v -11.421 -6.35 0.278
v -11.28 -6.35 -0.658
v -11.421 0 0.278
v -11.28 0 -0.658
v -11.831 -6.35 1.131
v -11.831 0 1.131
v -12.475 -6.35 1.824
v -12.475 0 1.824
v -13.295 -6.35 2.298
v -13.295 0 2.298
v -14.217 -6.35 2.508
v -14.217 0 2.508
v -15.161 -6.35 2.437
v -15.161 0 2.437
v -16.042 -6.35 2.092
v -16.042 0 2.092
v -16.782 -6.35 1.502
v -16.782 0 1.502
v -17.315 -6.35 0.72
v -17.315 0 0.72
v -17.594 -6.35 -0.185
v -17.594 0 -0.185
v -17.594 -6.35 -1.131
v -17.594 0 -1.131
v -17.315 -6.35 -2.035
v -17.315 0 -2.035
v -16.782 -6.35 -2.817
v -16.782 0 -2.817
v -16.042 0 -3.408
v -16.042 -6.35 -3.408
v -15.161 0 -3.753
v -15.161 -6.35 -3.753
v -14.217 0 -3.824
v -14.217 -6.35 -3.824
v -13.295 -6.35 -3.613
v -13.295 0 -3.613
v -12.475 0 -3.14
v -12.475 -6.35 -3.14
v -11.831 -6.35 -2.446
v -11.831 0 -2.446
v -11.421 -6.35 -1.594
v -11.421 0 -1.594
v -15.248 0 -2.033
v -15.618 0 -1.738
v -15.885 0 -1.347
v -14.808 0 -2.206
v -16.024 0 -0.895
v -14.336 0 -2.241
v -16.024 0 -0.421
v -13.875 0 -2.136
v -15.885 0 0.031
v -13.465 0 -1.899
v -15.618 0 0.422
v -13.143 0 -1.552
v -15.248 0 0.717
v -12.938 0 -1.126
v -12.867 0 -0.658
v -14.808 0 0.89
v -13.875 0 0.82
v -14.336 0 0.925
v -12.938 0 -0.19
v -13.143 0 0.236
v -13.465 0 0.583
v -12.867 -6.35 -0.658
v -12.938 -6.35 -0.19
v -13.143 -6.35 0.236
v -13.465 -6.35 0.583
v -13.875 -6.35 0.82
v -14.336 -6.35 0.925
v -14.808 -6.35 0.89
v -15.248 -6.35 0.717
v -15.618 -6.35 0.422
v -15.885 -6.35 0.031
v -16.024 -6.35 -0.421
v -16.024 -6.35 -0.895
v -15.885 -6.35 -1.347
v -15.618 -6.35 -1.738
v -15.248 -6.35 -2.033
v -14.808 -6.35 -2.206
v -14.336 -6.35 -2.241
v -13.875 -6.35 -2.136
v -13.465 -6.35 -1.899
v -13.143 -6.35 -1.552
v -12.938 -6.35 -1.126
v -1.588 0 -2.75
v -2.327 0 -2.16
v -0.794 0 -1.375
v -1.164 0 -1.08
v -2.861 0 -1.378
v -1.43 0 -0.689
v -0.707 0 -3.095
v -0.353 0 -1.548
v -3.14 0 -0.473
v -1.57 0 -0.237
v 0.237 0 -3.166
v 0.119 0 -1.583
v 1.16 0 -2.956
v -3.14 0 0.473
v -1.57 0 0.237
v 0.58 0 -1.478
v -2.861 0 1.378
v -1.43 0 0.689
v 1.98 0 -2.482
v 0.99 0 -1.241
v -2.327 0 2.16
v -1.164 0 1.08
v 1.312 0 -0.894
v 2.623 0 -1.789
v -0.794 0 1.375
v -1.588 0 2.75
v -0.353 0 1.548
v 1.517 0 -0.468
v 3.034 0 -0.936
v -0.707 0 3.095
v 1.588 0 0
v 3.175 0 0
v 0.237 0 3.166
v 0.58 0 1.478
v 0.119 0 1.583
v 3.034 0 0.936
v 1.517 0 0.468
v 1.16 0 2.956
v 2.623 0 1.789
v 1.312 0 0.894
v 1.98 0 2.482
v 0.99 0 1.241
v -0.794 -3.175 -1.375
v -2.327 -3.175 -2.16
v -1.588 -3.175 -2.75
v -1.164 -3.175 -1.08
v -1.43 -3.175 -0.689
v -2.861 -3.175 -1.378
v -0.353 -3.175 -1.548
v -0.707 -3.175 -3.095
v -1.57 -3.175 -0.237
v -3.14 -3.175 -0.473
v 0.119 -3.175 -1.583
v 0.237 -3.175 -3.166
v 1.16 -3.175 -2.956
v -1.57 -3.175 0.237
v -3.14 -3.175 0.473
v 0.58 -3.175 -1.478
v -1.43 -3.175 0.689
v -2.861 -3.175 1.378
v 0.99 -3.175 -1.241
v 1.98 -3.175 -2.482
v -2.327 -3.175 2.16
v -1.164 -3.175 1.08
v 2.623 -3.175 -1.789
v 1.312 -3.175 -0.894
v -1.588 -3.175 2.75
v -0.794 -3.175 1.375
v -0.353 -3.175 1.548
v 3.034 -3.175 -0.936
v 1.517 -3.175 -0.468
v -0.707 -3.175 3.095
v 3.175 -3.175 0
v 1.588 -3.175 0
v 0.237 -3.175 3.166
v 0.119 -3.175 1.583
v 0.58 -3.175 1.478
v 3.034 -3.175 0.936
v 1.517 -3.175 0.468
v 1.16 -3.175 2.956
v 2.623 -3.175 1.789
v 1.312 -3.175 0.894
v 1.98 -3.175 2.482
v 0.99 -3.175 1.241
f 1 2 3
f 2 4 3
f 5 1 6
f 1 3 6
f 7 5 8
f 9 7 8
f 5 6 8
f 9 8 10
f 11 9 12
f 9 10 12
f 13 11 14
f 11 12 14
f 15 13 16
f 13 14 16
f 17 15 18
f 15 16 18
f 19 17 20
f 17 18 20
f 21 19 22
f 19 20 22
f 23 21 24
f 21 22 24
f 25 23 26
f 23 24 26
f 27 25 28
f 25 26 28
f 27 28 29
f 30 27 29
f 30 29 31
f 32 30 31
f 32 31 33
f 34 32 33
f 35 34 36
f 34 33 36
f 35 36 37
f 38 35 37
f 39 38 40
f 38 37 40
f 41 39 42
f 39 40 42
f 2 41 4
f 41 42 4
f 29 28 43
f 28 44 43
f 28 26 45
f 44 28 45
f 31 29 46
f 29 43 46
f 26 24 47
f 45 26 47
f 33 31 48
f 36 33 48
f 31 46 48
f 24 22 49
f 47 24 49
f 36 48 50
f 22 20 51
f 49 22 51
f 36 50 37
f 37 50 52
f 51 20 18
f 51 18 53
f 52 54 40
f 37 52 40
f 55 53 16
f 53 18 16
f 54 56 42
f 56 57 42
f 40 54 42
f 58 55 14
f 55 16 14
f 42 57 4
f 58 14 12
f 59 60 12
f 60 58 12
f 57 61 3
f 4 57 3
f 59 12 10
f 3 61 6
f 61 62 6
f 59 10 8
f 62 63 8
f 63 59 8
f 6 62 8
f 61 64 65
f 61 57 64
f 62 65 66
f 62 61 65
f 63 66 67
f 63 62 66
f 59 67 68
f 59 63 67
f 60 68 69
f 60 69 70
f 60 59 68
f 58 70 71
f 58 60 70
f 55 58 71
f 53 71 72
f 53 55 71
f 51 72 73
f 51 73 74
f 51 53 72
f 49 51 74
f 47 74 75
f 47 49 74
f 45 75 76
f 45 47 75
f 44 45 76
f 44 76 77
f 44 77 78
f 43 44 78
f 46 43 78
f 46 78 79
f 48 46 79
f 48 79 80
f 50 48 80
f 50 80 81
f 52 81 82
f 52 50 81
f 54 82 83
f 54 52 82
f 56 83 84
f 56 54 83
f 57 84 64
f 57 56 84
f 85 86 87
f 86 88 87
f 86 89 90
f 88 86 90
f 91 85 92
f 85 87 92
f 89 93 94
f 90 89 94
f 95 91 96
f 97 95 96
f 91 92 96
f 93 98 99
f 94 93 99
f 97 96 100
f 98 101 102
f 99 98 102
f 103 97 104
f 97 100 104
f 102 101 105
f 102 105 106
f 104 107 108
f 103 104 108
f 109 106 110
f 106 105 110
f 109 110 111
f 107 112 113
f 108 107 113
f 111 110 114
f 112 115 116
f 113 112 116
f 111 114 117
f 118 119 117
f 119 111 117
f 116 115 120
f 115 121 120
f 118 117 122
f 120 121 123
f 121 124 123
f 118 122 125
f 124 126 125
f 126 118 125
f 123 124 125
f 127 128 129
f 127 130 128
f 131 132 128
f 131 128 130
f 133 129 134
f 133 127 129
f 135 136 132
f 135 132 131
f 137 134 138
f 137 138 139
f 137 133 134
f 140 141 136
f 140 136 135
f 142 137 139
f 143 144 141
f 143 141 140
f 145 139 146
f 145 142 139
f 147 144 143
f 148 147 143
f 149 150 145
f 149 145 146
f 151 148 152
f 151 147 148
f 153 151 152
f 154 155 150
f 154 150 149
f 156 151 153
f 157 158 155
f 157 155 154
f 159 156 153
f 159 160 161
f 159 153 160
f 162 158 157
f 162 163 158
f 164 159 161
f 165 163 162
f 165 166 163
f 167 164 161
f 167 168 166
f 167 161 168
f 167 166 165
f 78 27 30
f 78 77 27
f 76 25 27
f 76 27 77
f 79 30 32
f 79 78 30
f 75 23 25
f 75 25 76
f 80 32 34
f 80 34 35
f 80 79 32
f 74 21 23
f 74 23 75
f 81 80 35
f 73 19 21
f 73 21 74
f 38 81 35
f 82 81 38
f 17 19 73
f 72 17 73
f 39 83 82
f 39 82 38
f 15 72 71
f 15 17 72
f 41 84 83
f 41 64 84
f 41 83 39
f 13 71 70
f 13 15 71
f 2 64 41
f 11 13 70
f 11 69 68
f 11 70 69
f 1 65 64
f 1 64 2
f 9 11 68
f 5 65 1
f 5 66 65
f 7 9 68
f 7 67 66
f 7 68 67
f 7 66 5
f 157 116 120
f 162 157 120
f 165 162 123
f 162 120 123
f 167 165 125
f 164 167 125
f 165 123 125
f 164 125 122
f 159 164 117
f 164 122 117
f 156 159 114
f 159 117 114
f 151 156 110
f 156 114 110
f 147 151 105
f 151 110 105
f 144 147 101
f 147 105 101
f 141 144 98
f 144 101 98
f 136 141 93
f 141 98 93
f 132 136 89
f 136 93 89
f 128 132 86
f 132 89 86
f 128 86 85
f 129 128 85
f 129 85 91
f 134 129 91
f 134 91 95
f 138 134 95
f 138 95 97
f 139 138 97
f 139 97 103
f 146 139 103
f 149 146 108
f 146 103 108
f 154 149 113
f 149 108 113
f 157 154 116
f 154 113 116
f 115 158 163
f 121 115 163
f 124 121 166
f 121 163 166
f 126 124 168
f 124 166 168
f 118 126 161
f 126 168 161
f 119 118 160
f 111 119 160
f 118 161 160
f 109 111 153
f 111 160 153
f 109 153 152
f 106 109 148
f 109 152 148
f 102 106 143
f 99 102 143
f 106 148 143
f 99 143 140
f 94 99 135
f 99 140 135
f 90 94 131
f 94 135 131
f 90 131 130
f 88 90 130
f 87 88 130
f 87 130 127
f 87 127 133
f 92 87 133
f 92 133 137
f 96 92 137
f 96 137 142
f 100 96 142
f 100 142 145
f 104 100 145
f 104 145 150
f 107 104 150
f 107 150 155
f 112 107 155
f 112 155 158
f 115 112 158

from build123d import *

# Parameters (mm, degrees)
F0_R        = 3.175
F0_R_2      = 1.5875
F1_DEPTH    = 3.175
F2_R        = 1.5875
F3_DEPTH    = 3.176
F1_FACE_R   = 3.175
F1_FACE_R_2 = 1.5875
F4_DEPTH    = 3.175


with BuildPart() as f1:
    # F0 (on Front) → F1 (new body)
    with BuildSketch(Plane.XZ):
        Circle(F0_R)
        with Locations((-14.454545, -0.657917)):
            Circle(F0_R)
        with Locations((-14.454545, -0.657917)):
            Circle(F0_R_2, mode=Mode.SUBTRACT)
    extrude(amount=F1_DEPTH)

    # F2 (on face) → F3 (cut, through all)
    with BuildSketch(Plane.XZ.offset(3.175)):
        Circle(F2_R)
    extrude(amount=-F3_DEPTH, mode=Mode.SUBTRACT)

    # F1_face (on face) → F4 (join)
    with BuildSketch(Plane.XZ.offset(3.175)):
        with Locations((-14.454545, -0.657917)):
            Circle(F1_FACE_R)
        with Locations((-14.454545, -0.657917)):
            Circle(F1_FACE_R_2, mode=Mode.SUBTRACT)
    extrude(amount=F4_DEPTH)


solid = f1.part
